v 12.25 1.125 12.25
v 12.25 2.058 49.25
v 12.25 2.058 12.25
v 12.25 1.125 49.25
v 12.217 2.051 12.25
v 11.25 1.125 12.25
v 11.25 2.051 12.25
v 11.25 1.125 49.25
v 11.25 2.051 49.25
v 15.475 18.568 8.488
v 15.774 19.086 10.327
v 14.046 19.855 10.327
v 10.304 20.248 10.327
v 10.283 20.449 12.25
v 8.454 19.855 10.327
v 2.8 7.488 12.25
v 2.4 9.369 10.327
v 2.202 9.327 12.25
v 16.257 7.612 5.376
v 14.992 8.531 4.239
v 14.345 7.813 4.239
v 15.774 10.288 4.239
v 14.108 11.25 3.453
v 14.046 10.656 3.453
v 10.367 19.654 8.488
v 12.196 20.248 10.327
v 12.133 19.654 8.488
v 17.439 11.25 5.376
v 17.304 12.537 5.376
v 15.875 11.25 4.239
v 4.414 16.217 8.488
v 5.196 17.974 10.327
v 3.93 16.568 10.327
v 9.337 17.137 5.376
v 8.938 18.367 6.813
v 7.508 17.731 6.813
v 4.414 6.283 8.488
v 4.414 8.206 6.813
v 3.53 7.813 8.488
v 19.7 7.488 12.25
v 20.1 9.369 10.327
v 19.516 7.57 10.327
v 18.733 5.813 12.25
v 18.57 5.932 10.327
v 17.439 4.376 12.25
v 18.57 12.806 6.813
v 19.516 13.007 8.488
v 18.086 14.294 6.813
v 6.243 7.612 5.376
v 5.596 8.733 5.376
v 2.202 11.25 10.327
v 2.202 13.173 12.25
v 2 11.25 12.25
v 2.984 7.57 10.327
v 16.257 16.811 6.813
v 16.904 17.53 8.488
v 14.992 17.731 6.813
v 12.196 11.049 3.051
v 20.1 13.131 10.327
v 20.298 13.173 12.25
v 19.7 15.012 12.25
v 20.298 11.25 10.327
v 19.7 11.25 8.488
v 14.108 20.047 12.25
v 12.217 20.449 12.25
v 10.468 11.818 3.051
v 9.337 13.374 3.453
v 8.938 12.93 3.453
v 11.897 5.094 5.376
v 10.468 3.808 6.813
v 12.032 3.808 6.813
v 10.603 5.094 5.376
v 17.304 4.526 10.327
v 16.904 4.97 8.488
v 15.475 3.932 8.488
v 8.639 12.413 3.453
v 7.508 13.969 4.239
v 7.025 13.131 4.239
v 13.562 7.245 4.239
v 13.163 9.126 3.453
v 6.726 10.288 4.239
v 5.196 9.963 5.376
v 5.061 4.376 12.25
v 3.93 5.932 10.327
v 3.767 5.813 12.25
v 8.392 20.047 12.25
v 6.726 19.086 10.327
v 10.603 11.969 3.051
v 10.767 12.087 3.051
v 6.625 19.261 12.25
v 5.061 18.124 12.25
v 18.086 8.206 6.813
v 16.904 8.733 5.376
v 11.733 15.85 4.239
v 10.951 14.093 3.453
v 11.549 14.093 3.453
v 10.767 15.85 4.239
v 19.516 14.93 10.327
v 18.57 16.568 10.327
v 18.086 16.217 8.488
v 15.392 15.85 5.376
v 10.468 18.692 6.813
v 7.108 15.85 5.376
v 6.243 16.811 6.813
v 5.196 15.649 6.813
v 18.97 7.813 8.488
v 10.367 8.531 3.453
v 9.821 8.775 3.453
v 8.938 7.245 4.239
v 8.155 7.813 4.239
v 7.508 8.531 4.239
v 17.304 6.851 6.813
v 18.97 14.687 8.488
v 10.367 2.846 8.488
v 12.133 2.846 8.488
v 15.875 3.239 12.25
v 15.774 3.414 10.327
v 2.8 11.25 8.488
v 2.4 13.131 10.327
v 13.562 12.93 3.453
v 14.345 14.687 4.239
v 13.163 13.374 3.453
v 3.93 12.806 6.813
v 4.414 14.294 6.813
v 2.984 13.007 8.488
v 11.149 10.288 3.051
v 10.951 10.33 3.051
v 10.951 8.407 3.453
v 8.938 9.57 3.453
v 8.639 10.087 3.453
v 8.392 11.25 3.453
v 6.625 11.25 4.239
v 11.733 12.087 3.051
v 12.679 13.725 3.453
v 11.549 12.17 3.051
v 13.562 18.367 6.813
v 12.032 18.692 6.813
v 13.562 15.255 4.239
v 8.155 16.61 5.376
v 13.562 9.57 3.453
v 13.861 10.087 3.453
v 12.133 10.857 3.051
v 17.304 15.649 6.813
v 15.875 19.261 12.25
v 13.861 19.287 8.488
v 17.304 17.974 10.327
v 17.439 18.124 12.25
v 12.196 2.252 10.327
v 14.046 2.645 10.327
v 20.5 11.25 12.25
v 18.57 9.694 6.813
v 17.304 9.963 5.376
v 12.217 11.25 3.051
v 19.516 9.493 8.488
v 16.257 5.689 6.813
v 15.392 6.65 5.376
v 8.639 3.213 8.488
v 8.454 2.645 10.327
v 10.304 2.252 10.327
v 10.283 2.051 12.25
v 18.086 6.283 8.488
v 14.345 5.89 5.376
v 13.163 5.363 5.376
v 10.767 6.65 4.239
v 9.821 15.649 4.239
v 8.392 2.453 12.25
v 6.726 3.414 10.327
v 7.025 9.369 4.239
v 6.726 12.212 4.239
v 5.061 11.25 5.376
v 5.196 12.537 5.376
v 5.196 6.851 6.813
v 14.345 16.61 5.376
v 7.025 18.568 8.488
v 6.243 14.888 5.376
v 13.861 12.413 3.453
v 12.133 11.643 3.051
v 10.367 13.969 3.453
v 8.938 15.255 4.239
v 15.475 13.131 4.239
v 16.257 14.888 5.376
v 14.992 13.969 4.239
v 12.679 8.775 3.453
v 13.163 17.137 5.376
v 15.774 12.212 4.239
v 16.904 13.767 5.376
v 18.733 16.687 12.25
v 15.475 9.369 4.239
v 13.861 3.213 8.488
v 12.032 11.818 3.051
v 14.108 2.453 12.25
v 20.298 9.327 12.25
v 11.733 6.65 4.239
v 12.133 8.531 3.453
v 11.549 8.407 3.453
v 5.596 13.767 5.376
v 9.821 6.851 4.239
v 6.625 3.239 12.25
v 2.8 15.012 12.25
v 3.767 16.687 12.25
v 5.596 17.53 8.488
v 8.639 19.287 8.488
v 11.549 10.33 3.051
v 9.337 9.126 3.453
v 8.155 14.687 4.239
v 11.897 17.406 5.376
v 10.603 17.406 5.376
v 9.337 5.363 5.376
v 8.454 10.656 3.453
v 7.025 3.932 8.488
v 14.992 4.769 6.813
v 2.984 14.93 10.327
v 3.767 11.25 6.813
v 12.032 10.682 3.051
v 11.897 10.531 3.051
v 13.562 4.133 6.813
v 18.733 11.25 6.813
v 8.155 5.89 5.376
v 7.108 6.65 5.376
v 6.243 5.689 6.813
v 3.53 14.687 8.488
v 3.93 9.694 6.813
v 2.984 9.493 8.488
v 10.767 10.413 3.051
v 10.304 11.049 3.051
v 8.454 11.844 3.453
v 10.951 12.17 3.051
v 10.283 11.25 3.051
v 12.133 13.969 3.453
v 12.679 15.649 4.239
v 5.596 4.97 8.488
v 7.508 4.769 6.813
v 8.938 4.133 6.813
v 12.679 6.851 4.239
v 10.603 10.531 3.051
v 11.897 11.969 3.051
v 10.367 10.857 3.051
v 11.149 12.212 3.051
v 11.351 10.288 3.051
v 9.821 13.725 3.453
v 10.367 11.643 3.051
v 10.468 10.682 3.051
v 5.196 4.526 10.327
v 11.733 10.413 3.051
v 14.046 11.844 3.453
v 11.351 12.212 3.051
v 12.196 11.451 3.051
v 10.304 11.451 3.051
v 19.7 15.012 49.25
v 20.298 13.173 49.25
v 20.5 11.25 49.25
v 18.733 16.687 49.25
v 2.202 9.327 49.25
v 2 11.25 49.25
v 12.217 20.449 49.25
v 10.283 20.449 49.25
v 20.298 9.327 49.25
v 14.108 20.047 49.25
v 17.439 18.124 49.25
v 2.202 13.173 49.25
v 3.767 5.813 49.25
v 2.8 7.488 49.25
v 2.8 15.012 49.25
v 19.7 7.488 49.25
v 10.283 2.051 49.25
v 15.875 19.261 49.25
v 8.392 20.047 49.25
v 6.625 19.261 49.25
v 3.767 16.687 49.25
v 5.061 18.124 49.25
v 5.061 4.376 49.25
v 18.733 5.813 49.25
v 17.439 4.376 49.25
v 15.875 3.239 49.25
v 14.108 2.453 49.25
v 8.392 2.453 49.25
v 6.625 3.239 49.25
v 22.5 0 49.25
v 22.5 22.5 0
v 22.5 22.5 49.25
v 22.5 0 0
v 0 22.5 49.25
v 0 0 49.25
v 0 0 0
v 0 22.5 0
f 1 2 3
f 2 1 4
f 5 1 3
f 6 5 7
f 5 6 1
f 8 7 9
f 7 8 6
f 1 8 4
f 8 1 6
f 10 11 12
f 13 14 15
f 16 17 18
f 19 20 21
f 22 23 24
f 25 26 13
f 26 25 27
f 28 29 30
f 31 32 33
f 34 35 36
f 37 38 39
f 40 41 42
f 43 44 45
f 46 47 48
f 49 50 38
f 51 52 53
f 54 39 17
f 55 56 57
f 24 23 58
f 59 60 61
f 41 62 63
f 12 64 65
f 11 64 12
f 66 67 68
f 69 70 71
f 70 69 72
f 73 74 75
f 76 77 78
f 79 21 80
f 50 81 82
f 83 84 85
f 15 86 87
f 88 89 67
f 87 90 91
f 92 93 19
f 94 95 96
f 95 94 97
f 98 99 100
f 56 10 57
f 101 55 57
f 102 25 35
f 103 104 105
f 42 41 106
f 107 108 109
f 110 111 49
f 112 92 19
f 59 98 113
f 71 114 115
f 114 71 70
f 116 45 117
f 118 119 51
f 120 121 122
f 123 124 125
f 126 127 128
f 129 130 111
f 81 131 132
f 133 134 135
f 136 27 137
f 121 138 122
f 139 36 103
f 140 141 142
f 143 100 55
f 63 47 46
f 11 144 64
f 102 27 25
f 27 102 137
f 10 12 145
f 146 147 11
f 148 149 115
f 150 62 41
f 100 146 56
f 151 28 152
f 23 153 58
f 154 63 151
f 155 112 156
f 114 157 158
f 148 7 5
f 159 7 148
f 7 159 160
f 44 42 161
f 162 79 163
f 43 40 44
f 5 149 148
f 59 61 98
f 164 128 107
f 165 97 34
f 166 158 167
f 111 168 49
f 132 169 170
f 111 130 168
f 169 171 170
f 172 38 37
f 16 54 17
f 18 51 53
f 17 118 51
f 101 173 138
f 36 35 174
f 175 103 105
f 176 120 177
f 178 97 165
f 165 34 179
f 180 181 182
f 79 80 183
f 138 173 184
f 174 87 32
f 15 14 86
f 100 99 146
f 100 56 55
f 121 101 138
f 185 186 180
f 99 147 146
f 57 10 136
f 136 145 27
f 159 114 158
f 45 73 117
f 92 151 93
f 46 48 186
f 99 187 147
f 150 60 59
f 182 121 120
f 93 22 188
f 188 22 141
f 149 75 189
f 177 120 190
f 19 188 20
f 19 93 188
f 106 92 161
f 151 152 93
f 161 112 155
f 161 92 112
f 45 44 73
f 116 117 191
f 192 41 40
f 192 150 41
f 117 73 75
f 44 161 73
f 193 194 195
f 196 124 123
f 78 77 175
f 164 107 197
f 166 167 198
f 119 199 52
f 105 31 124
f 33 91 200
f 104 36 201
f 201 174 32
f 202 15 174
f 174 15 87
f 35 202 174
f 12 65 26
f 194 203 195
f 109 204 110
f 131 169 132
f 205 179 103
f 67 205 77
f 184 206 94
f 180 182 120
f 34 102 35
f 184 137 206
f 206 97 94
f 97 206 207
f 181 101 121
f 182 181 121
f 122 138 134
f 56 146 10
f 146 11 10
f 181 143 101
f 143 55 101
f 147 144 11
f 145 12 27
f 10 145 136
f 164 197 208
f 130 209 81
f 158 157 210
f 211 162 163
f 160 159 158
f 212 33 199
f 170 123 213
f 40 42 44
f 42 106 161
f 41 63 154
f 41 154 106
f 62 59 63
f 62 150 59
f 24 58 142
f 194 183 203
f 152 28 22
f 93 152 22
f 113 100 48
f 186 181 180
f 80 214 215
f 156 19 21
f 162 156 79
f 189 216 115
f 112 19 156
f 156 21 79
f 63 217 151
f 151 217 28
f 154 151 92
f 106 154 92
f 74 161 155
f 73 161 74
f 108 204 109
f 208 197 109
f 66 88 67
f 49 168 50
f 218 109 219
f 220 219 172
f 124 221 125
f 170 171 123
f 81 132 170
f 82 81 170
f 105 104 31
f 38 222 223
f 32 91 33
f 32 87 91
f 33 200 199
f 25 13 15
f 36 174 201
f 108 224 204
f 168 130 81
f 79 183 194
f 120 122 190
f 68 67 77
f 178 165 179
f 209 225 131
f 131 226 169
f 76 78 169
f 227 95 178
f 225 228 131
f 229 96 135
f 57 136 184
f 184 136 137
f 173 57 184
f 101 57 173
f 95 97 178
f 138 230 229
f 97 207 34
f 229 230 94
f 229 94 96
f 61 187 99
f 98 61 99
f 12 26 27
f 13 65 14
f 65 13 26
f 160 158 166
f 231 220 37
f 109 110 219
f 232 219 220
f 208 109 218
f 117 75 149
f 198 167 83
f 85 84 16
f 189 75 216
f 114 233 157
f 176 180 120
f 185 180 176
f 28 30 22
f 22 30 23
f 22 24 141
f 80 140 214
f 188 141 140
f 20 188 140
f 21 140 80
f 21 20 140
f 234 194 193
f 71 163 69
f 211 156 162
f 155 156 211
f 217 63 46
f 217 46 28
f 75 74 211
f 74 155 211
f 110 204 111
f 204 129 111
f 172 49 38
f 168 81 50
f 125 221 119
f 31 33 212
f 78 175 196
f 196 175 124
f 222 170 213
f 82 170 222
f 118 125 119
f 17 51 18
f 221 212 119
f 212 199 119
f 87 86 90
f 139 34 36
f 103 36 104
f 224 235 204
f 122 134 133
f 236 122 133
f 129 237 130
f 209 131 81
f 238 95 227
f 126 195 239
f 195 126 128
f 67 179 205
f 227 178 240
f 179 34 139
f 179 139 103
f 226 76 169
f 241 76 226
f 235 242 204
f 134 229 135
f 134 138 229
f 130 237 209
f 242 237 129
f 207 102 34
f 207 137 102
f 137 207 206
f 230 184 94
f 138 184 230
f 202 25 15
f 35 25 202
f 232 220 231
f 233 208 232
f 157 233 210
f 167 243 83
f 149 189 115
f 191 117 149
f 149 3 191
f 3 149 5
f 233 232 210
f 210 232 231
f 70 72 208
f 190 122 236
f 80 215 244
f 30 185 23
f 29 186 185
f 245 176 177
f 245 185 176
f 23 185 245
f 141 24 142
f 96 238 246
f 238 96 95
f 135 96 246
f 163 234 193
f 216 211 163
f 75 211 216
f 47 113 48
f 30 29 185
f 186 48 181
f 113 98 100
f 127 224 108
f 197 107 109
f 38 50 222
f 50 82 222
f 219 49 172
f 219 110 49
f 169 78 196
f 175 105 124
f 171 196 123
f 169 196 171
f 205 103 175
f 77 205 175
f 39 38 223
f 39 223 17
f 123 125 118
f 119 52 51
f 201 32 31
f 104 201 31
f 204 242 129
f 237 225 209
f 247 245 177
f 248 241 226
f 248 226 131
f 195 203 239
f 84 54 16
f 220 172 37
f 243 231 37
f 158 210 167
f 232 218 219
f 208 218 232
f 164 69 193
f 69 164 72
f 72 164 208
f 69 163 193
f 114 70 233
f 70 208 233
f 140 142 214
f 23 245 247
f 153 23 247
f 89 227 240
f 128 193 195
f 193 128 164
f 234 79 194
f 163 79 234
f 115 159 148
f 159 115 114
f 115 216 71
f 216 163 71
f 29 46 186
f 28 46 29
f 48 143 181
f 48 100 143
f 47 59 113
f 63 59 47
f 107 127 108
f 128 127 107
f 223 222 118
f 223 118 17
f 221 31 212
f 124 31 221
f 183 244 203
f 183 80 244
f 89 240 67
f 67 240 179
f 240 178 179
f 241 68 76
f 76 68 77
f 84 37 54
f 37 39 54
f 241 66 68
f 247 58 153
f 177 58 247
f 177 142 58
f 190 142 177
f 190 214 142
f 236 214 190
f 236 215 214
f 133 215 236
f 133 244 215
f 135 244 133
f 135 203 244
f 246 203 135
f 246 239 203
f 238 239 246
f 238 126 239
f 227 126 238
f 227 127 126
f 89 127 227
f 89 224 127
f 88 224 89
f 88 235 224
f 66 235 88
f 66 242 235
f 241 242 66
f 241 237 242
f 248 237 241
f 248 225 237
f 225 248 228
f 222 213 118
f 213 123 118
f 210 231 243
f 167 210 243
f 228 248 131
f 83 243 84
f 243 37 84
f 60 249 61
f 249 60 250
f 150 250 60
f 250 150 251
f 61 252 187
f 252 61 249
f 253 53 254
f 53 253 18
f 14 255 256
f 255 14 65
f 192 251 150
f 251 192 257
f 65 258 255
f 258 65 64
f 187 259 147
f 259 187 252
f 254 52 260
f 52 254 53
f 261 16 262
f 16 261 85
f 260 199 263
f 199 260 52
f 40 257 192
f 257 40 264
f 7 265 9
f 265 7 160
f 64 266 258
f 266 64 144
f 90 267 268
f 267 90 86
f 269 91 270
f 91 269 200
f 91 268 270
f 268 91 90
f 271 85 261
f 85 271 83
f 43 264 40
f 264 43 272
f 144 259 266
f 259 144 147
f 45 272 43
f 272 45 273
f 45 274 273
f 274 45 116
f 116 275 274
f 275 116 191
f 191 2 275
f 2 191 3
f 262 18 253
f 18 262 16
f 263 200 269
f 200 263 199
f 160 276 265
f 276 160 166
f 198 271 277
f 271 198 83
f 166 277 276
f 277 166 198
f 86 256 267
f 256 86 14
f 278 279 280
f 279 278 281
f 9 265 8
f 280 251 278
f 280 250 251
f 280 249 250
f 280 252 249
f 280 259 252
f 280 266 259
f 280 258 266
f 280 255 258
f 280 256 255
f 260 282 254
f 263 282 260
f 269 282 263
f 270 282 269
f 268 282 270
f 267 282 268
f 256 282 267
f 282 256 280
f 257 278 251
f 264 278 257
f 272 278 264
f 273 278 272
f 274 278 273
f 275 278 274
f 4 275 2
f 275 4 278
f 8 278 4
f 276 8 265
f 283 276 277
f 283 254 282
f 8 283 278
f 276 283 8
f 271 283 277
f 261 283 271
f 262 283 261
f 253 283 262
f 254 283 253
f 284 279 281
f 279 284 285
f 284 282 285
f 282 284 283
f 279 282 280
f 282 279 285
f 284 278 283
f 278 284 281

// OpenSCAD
rows = 1;
columns = 1;
radius = 9.25;
height = 38;
depth = height + radius;
offset = 2;
slotsize = (radius+offset)*2;
zpad = 1;
vent = (offset/2);

for (row = [0:rows-1])
    for (column = [0:columns-1])
        translate([column*slotsize,row*slotsize,0]) slot();

module hole() {
    translate([radius,-vent*(7/8),radius]) cube([vent,vent,height]);
    translate([radius,radius,radius]) sphere(radius);
    translate([radius,radius,radius]) cylinder(height,radius,radius);
}

module slot() {
    difference() {
        cube([slotsize,slotsize,radius+height+offset]);
        translate([offset,offset,offset+zpad]) hole();
    }
}    
